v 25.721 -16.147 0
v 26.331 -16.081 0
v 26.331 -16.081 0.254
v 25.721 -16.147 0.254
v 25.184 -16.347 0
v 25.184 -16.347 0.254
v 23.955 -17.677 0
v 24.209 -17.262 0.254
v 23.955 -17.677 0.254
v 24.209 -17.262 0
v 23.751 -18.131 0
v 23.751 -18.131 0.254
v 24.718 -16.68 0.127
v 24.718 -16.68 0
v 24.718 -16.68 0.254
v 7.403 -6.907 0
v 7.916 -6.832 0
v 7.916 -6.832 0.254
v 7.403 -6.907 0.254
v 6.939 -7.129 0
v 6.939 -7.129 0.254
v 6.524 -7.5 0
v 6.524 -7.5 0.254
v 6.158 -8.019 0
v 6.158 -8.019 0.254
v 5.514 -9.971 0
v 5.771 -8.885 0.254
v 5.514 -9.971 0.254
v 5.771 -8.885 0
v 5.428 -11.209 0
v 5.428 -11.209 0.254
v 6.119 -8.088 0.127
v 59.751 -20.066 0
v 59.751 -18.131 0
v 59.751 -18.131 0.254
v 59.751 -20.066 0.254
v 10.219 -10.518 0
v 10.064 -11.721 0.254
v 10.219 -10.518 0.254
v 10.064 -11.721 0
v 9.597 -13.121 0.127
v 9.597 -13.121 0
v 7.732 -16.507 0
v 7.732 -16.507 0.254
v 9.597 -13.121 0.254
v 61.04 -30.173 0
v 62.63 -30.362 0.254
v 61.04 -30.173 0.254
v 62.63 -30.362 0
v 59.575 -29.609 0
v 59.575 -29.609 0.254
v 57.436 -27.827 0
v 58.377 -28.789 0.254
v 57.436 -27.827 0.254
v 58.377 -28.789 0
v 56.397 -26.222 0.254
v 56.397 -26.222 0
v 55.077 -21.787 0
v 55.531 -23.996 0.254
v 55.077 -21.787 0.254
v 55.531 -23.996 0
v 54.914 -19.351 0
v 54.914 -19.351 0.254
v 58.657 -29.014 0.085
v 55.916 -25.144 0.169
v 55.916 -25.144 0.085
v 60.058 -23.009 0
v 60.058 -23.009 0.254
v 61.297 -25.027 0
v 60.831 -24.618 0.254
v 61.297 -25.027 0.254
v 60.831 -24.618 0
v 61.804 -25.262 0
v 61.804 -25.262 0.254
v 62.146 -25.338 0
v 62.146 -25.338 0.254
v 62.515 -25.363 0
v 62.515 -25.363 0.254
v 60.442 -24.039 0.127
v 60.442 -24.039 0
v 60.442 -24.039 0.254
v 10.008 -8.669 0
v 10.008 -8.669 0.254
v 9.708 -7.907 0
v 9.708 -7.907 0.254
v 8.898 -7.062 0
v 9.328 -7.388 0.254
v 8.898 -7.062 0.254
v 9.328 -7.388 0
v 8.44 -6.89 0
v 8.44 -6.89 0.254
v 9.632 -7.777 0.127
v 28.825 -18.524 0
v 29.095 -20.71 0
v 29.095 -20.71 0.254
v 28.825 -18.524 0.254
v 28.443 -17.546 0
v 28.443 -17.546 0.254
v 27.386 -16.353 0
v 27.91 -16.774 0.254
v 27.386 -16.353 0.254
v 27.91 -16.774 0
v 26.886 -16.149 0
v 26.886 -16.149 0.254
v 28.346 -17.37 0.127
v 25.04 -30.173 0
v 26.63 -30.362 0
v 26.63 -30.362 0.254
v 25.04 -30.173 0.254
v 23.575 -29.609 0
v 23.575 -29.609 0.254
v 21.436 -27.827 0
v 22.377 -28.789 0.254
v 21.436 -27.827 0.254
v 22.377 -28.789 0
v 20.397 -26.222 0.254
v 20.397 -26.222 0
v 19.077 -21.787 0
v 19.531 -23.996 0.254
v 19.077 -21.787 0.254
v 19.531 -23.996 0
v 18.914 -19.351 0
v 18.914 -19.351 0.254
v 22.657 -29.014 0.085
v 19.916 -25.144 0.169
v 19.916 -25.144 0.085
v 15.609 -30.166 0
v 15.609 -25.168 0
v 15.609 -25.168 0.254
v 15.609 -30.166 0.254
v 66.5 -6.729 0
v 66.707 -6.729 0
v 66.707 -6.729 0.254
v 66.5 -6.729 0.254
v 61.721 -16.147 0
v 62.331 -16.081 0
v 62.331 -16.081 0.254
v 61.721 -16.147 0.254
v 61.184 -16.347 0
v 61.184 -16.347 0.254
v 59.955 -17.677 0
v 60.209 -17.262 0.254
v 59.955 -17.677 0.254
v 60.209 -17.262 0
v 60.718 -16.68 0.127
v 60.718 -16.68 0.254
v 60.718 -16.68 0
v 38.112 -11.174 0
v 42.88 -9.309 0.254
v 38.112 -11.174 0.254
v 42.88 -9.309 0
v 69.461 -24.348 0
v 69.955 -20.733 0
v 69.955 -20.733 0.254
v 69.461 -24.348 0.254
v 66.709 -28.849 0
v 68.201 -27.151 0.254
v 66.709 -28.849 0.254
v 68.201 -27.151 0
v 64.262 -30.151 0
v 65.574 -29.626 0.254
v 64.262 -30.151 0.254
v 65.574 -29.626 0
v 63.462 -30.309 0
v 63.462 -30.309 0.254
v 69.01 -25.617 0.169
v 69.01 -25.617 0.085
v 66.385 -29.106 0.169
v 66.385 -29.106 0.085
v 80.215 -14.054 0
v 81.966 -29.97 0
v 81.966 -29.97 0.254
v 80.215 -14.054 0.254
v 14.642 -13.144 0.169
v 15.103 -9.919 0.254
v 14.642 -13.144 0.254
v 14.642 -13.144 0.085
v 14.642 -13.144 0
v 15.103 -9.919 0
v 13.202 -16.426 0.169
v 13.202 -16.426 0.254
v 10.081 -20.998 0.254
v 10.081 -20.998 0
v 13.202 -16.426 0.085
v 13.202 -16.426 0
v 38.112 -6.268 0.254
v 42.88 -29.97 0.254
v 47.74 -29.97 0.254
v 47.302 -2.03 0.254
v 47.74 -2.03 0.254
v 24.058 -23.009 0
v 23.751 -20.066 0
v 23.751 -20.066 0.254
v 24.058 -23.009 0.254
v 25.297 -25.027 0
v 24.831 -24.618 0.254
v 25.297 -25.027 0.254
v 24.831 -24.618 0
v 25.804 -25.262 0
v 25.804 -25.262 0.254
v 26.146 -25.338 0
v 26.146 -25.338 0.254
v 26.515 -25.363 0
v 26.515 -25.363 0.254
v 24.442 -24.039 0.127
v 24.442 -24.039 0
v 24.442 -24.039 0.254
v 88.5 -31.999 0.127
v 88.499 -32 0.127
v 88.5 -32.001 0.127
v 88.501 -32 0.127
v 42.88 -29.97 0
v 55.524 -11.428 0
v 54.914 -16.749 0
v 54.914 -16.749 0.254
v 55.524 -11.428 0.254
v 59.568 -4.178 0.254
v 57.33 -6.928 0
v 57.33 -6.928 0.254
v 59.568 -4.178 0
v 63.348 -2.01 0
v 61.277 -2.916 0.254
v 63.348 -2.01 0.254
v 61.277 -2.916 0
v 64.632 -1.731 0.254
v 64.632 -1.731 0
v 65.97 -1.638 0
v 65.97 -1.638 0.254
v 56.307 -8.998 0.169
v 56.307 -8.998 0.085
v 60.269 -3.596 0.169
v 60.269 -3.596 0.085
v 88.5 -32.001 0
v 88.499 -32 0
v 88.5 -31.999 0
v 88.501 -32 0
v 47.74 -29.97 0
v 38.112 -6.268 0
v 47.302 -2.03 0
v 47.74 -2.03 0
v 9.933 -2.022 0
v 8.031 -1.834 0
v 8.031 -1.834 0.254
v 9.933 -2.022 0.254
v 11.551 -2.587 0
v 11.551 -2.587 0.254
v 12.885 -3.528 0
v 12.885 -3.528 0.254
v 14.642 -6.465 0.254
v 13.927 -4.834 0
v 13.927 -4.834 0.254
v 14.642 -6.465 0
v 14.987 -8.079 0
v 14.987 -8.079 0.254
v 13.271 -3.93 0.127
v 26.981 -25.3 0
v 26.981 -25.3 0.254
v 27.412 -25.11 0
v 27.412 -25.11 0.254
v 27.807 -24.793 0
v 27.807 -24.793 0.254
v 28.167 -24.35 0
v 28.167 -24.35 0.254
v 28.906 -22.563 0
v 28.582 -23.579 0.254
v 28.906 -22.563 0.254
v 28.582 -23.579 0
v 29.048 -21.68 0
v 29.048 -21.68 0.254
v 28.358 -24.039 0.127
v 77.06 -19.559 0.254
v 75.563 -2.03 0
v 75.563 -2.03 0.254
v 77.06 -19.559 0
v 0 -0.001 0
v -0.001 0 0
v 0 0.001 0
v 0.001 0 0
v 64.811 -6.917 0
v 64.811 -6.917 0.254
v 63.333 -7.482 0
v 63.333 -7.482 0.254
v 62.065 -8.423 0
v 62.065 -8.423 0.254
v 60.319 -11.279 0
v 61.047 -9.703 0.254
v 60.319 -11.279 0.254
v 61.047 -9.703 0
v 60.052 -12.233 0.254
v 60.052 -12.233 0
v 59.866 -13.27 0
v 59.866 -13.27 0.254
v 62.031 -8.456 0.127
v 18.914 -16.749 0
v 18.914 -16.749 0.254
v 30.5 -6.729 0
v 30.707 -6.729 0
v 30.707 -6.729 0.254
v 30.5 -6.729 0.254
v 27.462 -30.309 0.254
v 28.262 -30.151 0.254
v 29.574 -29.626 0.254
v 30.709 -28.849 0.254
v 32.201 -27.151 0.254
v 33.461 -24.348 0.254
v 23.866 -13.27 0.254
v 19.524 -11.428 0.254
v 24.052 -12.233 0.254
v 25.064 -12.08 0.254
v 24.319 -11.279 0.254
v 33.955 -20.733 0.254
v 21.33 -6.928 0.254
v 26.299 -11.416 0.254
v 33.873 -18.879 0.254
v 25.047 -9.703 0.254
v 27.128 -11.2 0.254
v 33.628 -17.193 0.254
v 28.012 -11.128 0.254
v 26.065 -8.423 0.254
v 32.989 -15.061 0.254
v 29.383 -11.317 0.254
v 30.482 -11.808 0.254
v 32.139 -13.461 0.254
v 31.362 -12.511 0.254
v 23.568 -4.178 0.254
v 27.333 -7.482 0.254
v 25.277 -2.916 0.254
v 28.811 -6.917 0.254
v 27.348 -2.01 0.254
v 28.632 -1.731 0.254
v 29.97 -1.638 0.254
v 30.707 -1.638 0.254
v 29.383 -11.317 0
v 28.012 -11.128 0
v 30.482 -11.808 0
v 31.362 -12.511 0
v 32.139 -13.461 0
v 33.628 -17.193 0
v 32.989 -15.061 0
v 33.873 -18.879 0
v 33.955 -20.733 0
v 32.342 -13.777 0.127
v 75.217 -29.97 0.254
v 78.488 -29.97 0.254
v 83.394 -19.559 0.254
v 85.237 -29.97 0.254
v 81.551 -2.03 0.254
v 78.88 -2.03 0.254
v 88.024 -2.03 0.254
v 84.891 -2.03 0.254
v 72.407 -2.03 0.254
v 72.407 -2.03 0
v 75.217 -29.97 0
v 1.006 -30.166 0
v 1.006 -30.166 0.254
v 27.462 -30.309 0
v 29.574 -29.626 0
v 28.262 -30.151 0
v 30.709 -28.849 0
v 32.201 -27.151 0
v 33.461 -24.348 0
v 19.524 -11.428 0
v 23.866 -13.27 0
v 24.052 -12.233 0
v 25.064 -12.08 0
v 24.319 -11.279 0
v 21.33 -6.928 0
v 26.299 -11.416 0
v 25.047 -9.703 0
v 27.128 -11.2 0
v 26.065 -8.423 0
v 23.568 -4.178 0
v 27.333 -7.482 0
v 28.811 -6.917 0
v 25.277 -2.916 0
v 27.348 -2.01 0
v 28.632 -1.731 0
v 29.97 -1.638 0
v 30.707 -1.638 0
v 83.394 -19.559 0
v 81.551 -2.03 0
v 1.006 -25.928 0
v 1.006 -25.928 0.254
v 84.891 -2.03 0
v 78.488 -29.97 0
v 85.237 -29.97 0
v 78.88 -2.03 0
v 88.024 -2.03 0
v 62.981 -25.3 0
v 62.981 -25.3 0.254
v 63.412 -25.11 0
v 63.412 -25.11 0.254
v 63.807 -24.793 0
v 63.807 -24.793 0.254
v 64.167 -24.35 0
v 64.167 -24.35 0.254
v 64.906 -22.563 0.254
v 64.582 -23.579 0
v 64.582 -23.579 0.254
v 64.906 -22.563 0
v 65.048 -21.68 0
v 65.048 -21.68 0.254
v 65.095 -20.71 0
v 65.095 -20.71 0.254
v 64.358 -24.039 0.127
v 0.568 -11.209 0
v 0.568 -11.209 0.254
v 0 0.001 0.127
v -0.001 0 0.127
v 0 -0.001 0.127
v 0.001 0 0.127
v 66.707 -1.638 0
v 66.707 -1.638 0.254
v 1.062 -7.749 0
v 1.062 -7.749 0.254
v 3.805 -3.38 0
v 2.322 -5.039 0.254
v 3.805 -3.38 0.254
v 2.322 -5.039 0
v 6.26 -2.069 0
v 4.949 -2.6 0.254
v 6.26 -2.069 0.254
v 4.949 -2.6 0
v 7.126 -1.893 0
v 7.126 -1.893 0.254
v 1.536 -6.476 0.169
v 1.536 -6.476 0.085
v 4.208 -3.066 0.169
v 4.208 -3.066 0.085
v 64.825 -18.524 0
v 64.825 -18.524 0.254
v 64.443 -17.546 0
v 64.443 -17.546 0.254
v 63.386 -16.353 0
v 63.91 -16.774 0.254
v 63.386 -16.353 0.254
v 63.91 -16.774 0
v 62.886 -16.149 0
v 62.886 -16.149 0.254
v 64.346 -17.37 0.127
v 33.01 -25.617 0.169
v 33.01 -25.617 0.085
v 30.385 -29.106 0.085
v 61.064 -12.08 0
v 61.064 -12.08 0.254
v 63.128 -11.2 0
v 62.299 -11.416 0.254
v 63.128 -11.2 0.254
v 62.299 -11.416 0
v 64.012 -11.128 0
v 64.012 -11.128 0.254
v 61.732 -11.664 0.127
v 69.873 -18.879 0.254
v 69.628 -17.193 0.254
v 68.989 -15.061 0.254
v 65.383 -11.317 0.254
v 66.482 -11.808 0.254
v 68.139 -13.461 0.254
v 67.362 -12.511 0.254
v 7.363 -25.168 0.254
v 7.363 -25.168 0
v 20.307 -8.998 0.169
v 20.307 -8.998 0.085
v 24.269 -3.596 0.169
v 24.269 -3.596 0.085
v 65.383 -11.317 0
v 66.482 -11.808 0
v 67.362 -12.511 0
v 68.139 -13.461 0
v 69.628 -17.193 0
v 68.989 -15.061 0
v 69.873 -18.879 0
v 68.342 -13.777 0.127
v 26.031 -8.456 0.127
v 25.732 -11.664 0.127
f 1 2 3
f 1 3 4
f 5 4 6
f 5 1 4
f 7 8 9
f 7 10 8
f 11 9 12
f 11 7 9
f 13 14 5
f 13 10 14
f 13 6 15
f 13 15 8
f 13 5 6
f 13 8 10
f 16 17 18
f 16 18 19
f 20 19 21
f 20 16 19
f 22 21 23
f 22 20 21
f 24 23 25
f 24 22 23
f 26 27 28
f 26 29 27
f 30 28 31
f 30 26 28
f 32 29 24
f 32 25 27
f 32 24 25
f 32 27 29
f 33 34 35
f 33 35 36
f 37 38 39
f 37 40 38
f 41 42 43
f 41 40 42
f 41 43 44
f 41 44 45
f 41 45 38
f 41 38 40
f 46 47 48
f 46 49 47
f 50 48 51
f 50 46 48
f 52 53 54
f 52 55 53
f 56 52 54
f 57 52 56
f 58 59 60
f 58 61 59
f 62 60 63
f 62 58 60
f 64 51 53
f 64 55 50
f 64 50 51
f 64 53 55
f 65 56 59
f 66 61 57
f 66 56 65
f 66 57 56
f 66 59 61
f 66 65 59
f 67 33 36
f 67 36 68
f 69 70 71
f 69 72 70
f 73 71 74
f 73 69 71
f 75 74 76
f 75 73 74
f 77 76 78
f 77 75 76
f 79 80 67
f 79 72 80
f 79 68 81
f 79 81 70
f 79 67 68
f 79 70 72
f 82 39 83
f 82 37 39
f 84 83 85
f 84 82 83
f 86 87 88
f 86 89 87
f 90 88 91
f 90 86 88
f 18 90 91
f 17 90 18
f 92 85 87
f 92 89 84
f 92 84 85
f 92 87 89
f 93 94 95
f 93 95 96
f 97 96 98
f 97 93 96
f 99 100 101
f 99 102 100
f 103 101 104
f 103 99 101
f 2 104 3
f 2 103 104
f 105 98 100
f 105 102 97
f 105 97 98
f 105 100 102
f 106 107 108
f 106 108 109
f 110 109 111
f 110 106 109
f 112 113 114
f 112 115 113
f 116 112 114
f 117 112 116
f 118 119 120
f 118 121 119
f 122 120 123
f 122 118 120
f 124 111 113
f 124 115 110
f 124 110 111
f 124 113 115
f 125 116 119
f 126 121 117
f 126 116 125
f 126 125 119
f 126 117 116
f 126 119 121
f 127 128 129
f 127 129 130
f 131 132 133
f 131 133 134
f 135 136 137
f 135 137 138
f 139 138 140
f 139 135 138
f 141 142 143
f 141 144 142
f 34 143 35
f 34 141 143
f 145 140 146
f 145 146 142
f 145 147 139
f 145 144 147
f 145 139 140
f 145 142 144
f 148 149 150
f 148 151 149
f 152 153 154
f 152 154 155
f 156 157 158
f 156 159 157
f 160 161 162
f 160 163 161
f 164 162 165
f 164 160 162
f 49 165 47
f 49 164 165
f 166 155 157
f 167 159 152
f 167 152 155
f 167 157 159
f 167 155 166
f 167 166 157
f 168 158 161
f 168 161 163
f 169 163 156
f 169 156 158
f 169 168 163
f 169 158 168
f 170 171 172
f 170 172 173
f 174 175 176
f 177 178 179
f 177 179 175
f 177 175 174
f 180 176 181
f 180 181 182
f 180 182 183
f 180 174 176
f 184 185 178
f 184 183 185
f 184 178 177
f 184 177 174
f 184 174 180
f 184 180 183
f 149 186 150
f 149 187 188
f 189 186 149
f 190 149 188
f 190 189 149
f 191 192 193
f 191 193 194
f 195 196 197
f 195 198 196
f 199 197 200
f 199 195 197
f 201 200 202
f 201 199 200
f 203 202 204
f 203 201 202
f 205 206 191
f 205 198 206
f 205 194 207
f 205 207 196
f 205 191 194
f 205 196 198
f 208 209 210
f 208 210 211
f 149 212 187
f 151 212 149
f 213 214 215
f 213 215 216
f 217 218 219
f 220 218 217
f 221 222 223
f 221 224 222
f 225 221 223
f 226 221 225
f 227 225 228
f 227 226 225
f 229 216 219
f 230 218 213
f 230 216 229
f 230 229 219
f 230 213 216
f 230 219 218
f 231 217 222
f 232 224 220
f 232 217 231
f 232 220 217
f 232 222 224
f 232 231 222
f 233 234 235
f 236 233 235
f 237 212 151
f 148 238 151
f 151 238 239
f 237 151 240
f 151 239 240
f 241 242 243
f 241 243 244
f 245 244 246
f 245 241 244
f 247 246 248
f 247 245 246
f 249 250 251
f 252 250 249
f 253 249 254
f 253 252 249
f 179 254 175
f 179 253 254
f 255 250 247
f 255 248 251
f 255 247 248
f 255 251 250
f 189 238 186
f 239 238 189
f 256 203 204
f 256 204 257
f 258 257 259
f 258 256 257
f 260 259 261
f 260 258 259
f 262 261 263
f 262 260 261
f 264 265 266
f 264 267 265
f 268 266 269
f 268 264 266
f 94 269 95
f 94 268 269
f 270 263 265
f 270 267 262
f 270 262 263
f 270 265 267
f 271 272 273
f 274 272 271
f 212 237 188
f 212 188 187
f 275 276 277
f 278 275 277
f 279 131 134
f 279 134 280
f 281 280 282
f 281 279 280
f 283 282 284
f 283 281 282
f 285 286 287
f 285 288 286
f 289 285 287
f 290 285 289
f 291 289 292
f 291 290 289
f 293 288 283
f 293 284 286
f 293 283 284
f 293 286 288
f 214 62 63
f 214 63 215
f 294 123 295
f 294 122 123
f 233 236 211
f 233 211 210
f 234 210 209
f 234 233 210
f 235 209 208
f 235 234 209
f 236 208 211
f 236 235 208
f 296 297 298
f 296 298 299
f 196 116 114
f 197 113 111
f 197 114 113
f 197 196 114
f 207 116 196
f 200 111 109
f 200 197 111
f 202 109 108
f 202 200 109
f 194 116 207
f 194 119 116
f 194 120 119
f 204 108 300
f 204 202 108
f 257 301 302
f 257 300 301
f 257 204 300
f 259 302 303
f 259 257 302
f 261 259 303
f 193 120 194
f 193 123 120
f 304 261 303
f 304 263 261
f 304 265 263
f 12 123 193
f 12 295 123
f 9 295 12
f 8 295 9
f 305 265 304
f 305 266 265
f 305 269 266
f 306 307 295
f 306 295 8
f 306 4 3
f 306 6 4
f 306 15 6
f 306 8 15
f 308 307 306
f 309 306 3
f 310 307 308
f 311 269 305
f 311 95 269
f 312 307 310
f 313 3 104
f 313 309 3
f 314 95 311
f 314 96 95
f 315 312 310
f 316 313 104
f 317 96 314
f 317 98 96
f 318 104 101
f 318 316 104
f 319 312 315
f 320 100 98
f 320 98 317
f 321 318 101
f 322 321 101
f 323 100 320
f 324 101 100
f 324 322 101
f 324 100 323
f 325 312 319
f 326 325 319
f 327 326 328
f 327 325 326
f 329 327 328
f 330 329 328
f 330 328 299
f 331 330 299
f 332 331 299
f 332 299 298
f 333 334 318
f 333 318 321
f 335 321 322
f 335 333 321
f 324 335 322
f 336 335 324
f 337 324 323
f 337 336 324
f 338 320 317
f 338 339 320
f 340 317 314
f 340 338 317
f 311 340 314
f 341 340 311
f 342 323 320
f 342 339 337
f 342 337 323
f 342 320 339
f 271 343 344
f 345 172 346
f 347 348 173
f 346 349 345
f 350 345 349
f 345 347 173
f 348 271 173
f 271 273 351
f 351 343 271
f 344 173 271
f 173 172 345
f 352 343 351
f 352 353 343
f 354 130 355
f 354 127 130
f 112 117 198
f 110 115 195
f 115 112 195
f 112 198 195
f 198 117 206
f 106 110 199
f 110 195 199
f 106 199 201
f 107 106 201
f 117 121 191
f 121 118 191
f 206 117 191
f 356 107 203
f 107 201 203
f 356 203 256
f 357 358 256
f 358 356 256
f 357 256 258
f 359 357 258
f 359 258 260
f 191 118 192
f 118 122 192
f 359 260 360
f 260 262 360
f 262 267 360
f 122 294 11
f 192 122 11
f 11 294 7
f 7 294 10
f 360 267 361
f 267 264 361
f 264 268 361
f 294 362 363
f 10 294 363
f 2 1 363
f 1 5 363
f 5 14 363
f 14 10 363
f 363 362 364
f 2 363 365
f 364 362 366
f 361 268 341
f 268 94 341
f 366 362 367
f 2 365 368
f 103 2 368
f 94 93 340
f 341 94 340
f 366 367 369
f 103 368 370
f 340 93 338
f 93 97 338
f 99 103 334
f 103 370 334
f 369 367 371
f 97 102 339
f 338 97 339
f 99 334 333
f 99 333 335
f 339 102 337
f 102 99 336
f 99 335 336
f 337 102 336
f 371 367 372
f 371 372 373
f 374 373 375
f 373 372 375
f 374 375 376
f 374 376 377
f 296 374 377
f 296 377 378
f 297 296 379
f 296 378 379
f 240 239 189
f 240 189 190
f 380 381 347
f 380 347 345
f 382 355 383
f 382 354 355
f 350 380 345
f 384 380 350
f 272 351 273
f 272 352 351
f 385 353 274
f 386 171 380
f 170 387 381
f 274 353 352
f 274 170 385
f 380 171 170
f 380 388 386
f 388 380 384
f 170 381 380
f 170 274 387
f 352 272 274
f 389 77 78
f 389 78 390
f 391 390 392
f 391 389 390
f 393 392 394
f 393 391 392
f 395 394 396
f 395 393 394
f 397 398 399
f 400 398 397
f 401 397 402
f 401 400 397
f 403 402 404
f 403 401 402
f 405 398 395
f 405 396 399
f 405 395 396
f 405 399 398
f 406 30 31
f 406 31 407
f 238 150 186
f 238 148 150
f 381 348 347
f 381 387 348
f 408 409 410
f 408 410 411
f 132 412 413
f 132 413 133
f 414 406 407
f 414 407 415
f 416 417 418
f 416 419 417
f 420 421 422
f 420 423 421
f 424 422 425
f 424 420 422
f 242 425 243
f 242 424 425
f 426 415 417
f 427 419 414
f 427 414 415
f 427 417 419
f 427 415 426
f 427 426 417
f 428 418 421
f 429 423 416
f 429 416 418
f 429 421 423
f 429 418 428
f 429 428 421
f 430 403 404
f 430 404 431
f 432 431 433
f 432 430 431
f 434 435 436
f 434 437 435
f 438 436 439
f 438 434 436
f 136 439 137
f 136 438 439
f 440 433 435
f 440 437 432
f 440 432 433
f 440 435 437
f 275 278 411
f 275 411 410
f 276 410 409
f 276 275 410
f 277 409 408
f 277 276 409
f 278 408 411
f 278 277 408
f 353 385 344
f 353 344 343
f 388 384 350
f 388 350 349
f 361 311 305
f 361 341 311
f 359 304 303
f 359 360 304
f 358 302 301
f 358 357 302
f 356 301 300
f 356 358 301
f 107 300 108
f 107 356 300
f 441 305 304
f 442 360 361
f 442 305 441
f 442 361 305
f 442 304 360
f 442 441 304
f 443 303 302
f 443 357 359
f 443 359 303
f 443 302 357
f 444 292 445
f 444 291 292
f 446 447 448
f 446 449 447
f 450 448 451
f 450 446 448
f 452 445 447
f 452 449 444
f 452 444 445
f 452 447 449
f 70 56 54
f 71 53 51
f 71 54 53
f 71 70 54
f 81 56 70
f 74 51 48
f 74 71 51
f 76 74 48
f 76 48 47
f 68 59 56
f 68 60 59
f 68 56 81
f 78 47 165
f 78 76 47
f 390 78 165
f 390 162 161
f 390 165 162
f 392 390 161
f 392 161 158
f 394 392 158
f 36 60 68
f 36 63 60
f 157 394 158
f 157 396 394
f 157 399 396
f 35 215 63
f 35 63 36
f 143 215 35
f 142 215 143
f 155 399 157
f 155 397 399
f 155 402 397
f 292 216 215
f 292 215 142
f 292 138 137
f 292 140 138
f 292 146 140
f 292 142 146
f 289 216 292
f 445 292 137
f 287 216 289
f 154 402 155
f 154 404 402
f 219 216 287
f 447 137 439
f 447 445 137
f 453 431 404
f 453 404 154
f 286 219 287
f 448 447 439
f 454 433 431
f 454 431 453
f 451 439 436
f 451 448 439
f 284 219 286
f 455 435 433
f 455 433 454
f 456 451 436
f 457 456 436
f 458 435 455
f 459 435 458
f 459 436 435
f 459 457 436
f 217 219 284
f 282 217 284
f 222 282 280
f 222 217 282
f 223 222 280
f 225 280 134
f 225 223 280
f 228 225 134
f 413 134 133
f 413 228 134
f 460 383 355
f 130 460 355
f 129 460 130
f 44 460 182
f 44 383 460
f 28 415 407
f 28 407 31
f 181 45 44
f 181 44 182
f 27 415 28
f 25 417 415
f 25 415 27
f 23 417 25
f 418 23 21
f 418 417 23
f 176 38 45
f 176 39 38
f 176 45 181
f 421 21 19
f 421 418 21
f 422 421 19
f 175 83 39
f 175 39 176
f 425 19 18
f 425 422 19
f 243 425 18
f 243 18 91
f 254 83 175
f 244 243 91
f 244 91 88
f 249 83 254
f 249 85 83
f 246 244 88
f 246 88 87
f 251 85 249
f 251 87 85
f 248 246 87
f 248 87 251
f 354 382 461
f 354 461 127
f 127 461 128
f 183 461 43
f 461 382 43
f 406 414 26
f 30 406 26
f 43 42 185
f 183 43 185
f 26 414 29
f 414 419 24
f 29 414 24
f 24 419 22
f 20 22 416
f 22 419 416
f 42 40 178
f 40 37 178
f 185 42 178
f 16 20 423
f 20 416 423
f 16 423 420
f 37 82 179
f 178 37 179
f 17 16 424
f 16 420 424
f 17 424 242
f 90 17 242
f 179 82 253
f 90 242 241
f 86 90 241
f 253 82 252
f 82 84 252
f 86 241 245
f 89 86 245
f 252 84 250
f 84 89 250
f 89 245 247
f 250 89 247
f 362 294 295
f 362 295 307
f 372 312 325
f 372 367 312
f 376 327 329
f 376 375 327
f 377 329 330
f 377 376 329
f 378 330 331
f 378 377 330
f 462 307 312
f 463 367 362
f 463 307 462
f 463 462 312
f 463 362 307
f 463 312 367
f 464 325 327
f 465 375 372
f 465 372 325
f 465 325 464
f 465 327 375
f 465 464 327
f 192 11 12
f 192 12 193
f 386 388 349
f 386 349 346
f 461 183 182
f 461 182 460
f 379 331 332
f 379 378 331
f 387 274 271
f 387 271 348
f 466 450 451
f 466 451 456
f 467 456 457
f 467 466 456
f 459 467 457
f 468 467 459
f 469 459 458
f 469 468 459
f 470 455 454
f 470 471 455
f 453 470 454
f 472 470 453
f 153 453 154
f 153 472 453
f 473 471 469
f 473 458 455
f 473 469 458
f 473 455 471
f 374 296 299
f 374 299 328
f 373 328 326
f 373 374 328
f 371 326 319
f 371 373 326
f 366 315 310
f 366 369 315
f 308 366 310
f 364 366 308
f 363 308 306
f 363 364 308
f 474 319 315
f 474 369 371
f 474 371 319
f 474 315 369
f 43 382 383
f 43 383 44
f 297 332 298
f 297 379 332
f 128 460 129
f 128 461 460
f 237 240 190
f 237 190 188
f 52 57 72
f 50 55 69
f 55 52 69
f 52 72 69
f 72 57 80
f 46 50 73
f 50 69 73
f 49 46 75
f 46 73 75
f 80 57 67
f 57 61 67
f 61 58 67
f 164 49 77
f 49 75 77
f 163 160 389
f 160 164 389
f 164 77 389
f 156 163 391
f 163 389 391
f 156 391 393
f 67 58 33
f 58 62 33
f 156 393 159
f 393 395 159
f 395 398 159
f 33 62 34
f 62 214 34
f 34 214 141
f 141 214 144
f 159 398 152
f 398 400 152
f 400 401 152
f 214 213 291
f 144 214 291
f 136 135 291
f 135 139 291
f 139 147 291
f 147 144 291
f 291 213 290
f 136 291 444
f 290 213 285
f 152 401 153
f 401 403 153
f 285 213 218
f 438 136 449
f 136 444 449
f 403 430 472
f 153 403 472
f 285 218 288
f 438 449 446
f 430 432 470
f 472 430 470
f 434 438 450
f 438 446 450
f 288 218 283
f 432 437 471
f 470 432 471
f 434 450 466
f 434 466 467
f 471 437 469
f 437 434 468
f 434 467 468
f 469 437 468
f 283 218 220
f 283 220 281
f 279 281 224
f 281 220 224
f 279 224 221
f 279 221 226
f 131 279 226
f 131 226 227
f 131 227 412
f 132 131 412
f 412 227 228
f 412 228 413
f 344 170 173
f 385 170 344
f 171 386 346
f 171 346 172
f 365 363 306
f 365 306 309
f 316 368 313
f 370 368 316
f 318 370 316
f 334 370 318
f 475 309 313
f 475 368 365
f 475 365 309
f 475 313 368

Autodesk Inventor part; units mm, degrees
ref_plane "YZ Plane" through (0, 0, 0) normal (1, 0, 0) x (0, 1, 0)
ref_plane "XZ Plane" through (0, 0, 0) normal (0, 1, 0) x (-1, 0, 0)
ref_plane "XY Plane" through (0, 0, 0) normal (0, 0, 1) x (1, 0, 0)
sketch "Sketch1" plane through (0, 0, 0) normal (0, 0, 1) x (1, 0, 0)
  line L0 (36, 0) -> (52.5, 0) construction
  line L1 (52.5, 0) -> (52.5, -32) construction
  line L2 (52.5, -32) -> (36, -32) construction
  line L3 (36, -32) -> (36, 0) construction
  line L4 (52.5, -32) -> (54, -32) construction
  line L5 (54, 0) -> (70.5, 0) construction
  line L6 (70.5, 0) -> (70.5, -32) construction
  line L7 (70.5, -32) -> (54, -32) construction
  line L8 (54, -32) -> (54, 0) construction
  line L9 (70.5, -32) -> (72, -32) construction
  line L10 (0, 0) -> (16.5, 0) construction
  line L11 (16.5, 0) -> (16.5, -32) construction
  line L12 (16.5, -32) -> (0, -32) construction
  line L13 (0, -32) -> (0, 0) construction
  line L14 (16.5, -32) -> (18, -32) construction
  line L15 (18, -32) -> (18, 0) construction
  line L16 (18, 0) -> (34.5, 0) construction
  line L17 (34.5, 0) -> (34.5, -32) construction
  line L18 (34.5, -32) -> (18, -32) construction
  line L19 (34.5, -32) -> (36, -32) construction
  line L20 (72, -32) -> (72, 0) construction
  line L21 (72, 0) -> (88.5, 0) construction
  line L22 (88.5, 0) -> (88.5, -32) construction
  line L23 (88.5, -32) -> (72, -32) construction
  circle A0 centre (88.5, -32) radius 0.0013
  circle A1 centre (0, 0) radius 0.0013
  line L24 (15.6093, -30.1658) -> (1.0059, -30.1658)
  line L25 (1.0059, -30.1658) -> (1.0059, -25.9276)
  line L26 (1.0059, -25.9276) -> (7.7317, -16.5067)
  spline S0 degree 2 poles (7.7317, -16.5067) (10.2194, -12.7292) (10.2194, -10.518) knots 0 0 0 1 1 1
  spline S1 degree 2 poles (10.2194, -10.518) (10.2194, -8.7213) (9.0447, -6.8325) (7.916, -6.8325) knots 0 0 0 1 2 2 2
  spline S2 degree 2 poles (7.916, -6.8325) (6.8104, -6.8325) (5.4284, -9.3432) (5.4284, -11.209) knots 0 0 0 1 2 2 2
  line L27 (5.4284, -11.209) -> (0.5682, -11.209)
  spline S3 degree 2 poles (0.5682, -11.209) (0.5682, -8.6522) (2.5031, -4.2988) (5.9121, -1.8342) (8.0312, -1.8342) knots 0 0 0 1 2 3 3 3
  spline S4 degree 2 poles (8.0312, -1.8342) (11.4402, -1.8342) (15.1026, -6.0264) (15.1026, -9.9191) knots 0 0 0 1 2 2 2
  spline S5 degree 2 poles (15.1026, -9.9191) (15.1026, -11.5775) (14.1812, -14.7101) (12.2233, -18.1421) (10.0812, -20.9983) knots 0 0 0 1 2 3 3 3
  line L28 (10.0812, -20.9983) -> (7.3632, -25.1675)
  line L29 (7.3632, -25.1675) -> (15.6093, -25.1675)
  line L30 (15.6093, -25.1675) -> (15.6093, -30.1658)
  line L31 (30.707, -1.6384) -> (30.707, -6.7289)
  line L32 (30.707, -6.7289) -> (30.4997, -6.7289)
  spline S6 degree 2 poles (30.4997, -6.7289) (27.7817, -6.7289) (24.2806, -10.184) (23.866, -13.2705) knots 0 0 0 1 2 2 2
  spline S7 degree 2 poles (23.866, -13.2705) (25.5244, -11.1284) (28.0121, -11.1284) knots 0 0 0 1 1 1
  spline S8 degree 2 poles (28.0121, -11.1284) (30.7301, -11.1284) (33.9548, -16.4261) (33.9548, -20.7334) knots 0 0 0 1 2 2 2
  spline S9 degree 2 poles (33.9548, -20.7334) (33.9548, -23.3823) (32.066, -27.8509) (28.7031, -30.3616) (26.6301, -30.3616) knots 0 0 0 1 2 3 3 3
  spline S10 degree 2 poles (26.6301, -30.3616) (24.4188, -30.3616) (20.8946, -27.6666) (18.9368, -22.6222) (18.9137, -19.3514) knots 0 0 0 1 2 3 3 3
  line L33 (18.9137, -19.3514) -> (18.9137, -16.7486)
  spline S11 degree 2 poles (18.9137, -16.7486) (18.9137, -12.4413) (21.7008, -5.5542) (26.8374, -1.6384) (29.97, -1.6384) knots 0 0 0 1 2 3 3 3
  line L34 (29.97, -1.6384) -> (30.707, -1.6384)
  spline S12 degree 2 poles (26.3306, -16.0806) (25.3632, -16.0806) (24.0733, -17.2784) (23.7508, -18.1306) knots 0 0 0 1 2 2 2
  line L35 (23.7508, -18.1306) -> (23.7508, -20.0655)
  spline S13 degree 2 poles (23.7508, -20.0655) (23.7508, -25.3632) (26.5149, -25.3632) knots 0 0 0 1 1 1
  spline S14 degree 2 poles (26.5149, -25.3632) (27.6205, -25.3632) (29.0947, -22.7144) (29.0947, -20.7104) knots 0 0 0 1 2 2 2
  spline S15 degree 2 poles (29.0947, -20.7104) (29.0947, -18.6604) (27.5975, -16.0806) (26.3306, -16.0806) knots 0 0 0 1 2 2 2
  line L36 (47.7396, -29.97) -> (42.8795, -29.97)
  line L37 (42.8795, -29.97) -> (42.8795, -9.3087)
  line L38 (42.8795, -9.3087) -> (38.1115, -11.1744)
  line L39 (38.1115, -11.1744) -> (38.1115, -6.2682)
  line L40 (38.1115, -6.2682) -> (47.302, -2.03)
  line L41 (47.302, -2.03) -> (47.7396, -2.03)
  line L42 (47.7396, -2.03) -> (47.7396, -29.97)
  line L43 (66.707, -1.6384) -> (66.707, -6.7289)
  line L44 (66.707, -6.7289) -> (66.4997, -6.7289)
  spline S16 degree 2 poles (66.4997, -6.7289) (63.7817, -6.7289) (60.2806, -10.184) (59.866, -13.2705) knots 0 0 0 1 2 2 2
  spline S17 degree 2 poles (59.866, -13.2705) (61.5244, -11.1284) (64.0121, -11.1284) knots 0 0 0 1 1 1
  spline S18 degree 2 poles (64.0121, -11.1284) (66.7301, -11.1284) (69.9548, -16.4261) (69.9548, -20.7334) knots 0 0 0 1 2 2 2
  spline S19 degree 2 poles (69.9548, -20.7334) (69.9548, -23.3823) (68.066, -27.8509) (64.7031, -30.3616) (62.6301, -30.3616) knots 0 0 0 1 2 3 3 3
  spline S20 degree 2 poles (62.6301, -30.3616) (60.4188, -30.3616) (56.8946, -27.6666) (54.9368, -22.6222) (54.9137, -19.3514) knots 0 0 0 1 2 3 3 3
  line L45 (54.9137, -19.3514) -> (54.9137, -16.7486)
  spline S21 degree 2 poles (54.9137, -16.7486) (54.9137, -12.4413) (57.7008, -5.5542) (62.8374, -1.6384) (65.97, -1.6384) knots 0 0 0 1 2 3 3 3
  line L46 (65.97, -1.6384) -> (66.707, -1.6384)
  spline S22 degree 2 poles (62.3306, -16.0806) (61.3632, -16.0806) (60.0733, -17.2784) (59.7508, -18.1306) knots 0 0 0 1 2 2 2
  line L47 (59.7508, -18.1306) -> (59.7508, -20.0655)
  spline S23 degree 2 poles (59.7508, -20.0655) (59.7508, -25.3632) (62.5149, -25.3632) knots 0 0 0 1 1 1
  spline S24 degree 2 poles (62.5149, -25.3632) (63.6205, -25.3632) (65.0947, -22.7144) (65.0947, -20.7104) knots 0 0 0 1 2 2 2
  spline S25 degree 2 poles (65.0947, -20.7104) (65.0947, -18.6604) (63.5975, -16.0806) (62.3306, -16.0806) knots 0 0 0 1 2 2 2
  line L48 (83.3941, -19.5587) -> (84.8913, -2.03)
  line L49 (84.8913, -2.03) -> (88.0239, -2.03)
  line L50 (88.0239, -2.03) -> (85.2368, -29.97)
  line L51 (85.2368, -29.97) -> (81.966, -29.97)
  line L52 (81.966, -29.97) -> (80.2154, -14.0536)
  line L53 (80.2154, -14.0536) -> (78.4879, -29.97)
  line L54 (78.4879, -29.97) -> (75.2171, -29.97)
  line L55 (75.2171, -29.97) -> (72.407, -2.03)
  line L56 (72.407, -2.03) -> (75.5626, -2.03)
  line L57 (75.5626, -2.03) -> (77.0598, -19.5587)
  line L58 (77.0598, -19.5587) -> (78.8795, -2.03)
  line L59 (78.8795, -2.03) -> (81.5514, -2.03)
  line L60 (81.5514, -2.03) -> (83.3941, -19.5587)
  dimension "d4" = 16.5
  dimension "d5" = 1.5
  dimension "d9" = 16.5
  dimension "d10" = 1.5
  dimension "d11" = 32
  dimension "d12" = 16.5
  dimension "d13" = 1.5
  dimension "d15" = 16.5
  dimension "d16" = 1.5
  dimension "d18" = 16.5
  dimension "d26" = 0.0025
  dimension "d28" = 0.0025
extrude "Extrusion1" add sketch "Sketch1" along normal blind 0.254 contours L24 L25 L26 S0 S1 S2 L27 S3 S4 S5 L28 L29 L30 | L31 L32 S6 S7 S8 S9 S10 L33 S11 L34 | L36 L37 L38 L39 L40 L41 L42 | L43 L44 S16 S17 S18 S19 S20 L45 S21 L46 | L48 L49 L50 L51 L52 L53 L54 L55 L56 L57 L58 L59 L60
extrude "Extrusion2" add sketch "Sketch1" along normal blind 0.127 contours A0 | A1
properties part number "License Plate Numbers"
